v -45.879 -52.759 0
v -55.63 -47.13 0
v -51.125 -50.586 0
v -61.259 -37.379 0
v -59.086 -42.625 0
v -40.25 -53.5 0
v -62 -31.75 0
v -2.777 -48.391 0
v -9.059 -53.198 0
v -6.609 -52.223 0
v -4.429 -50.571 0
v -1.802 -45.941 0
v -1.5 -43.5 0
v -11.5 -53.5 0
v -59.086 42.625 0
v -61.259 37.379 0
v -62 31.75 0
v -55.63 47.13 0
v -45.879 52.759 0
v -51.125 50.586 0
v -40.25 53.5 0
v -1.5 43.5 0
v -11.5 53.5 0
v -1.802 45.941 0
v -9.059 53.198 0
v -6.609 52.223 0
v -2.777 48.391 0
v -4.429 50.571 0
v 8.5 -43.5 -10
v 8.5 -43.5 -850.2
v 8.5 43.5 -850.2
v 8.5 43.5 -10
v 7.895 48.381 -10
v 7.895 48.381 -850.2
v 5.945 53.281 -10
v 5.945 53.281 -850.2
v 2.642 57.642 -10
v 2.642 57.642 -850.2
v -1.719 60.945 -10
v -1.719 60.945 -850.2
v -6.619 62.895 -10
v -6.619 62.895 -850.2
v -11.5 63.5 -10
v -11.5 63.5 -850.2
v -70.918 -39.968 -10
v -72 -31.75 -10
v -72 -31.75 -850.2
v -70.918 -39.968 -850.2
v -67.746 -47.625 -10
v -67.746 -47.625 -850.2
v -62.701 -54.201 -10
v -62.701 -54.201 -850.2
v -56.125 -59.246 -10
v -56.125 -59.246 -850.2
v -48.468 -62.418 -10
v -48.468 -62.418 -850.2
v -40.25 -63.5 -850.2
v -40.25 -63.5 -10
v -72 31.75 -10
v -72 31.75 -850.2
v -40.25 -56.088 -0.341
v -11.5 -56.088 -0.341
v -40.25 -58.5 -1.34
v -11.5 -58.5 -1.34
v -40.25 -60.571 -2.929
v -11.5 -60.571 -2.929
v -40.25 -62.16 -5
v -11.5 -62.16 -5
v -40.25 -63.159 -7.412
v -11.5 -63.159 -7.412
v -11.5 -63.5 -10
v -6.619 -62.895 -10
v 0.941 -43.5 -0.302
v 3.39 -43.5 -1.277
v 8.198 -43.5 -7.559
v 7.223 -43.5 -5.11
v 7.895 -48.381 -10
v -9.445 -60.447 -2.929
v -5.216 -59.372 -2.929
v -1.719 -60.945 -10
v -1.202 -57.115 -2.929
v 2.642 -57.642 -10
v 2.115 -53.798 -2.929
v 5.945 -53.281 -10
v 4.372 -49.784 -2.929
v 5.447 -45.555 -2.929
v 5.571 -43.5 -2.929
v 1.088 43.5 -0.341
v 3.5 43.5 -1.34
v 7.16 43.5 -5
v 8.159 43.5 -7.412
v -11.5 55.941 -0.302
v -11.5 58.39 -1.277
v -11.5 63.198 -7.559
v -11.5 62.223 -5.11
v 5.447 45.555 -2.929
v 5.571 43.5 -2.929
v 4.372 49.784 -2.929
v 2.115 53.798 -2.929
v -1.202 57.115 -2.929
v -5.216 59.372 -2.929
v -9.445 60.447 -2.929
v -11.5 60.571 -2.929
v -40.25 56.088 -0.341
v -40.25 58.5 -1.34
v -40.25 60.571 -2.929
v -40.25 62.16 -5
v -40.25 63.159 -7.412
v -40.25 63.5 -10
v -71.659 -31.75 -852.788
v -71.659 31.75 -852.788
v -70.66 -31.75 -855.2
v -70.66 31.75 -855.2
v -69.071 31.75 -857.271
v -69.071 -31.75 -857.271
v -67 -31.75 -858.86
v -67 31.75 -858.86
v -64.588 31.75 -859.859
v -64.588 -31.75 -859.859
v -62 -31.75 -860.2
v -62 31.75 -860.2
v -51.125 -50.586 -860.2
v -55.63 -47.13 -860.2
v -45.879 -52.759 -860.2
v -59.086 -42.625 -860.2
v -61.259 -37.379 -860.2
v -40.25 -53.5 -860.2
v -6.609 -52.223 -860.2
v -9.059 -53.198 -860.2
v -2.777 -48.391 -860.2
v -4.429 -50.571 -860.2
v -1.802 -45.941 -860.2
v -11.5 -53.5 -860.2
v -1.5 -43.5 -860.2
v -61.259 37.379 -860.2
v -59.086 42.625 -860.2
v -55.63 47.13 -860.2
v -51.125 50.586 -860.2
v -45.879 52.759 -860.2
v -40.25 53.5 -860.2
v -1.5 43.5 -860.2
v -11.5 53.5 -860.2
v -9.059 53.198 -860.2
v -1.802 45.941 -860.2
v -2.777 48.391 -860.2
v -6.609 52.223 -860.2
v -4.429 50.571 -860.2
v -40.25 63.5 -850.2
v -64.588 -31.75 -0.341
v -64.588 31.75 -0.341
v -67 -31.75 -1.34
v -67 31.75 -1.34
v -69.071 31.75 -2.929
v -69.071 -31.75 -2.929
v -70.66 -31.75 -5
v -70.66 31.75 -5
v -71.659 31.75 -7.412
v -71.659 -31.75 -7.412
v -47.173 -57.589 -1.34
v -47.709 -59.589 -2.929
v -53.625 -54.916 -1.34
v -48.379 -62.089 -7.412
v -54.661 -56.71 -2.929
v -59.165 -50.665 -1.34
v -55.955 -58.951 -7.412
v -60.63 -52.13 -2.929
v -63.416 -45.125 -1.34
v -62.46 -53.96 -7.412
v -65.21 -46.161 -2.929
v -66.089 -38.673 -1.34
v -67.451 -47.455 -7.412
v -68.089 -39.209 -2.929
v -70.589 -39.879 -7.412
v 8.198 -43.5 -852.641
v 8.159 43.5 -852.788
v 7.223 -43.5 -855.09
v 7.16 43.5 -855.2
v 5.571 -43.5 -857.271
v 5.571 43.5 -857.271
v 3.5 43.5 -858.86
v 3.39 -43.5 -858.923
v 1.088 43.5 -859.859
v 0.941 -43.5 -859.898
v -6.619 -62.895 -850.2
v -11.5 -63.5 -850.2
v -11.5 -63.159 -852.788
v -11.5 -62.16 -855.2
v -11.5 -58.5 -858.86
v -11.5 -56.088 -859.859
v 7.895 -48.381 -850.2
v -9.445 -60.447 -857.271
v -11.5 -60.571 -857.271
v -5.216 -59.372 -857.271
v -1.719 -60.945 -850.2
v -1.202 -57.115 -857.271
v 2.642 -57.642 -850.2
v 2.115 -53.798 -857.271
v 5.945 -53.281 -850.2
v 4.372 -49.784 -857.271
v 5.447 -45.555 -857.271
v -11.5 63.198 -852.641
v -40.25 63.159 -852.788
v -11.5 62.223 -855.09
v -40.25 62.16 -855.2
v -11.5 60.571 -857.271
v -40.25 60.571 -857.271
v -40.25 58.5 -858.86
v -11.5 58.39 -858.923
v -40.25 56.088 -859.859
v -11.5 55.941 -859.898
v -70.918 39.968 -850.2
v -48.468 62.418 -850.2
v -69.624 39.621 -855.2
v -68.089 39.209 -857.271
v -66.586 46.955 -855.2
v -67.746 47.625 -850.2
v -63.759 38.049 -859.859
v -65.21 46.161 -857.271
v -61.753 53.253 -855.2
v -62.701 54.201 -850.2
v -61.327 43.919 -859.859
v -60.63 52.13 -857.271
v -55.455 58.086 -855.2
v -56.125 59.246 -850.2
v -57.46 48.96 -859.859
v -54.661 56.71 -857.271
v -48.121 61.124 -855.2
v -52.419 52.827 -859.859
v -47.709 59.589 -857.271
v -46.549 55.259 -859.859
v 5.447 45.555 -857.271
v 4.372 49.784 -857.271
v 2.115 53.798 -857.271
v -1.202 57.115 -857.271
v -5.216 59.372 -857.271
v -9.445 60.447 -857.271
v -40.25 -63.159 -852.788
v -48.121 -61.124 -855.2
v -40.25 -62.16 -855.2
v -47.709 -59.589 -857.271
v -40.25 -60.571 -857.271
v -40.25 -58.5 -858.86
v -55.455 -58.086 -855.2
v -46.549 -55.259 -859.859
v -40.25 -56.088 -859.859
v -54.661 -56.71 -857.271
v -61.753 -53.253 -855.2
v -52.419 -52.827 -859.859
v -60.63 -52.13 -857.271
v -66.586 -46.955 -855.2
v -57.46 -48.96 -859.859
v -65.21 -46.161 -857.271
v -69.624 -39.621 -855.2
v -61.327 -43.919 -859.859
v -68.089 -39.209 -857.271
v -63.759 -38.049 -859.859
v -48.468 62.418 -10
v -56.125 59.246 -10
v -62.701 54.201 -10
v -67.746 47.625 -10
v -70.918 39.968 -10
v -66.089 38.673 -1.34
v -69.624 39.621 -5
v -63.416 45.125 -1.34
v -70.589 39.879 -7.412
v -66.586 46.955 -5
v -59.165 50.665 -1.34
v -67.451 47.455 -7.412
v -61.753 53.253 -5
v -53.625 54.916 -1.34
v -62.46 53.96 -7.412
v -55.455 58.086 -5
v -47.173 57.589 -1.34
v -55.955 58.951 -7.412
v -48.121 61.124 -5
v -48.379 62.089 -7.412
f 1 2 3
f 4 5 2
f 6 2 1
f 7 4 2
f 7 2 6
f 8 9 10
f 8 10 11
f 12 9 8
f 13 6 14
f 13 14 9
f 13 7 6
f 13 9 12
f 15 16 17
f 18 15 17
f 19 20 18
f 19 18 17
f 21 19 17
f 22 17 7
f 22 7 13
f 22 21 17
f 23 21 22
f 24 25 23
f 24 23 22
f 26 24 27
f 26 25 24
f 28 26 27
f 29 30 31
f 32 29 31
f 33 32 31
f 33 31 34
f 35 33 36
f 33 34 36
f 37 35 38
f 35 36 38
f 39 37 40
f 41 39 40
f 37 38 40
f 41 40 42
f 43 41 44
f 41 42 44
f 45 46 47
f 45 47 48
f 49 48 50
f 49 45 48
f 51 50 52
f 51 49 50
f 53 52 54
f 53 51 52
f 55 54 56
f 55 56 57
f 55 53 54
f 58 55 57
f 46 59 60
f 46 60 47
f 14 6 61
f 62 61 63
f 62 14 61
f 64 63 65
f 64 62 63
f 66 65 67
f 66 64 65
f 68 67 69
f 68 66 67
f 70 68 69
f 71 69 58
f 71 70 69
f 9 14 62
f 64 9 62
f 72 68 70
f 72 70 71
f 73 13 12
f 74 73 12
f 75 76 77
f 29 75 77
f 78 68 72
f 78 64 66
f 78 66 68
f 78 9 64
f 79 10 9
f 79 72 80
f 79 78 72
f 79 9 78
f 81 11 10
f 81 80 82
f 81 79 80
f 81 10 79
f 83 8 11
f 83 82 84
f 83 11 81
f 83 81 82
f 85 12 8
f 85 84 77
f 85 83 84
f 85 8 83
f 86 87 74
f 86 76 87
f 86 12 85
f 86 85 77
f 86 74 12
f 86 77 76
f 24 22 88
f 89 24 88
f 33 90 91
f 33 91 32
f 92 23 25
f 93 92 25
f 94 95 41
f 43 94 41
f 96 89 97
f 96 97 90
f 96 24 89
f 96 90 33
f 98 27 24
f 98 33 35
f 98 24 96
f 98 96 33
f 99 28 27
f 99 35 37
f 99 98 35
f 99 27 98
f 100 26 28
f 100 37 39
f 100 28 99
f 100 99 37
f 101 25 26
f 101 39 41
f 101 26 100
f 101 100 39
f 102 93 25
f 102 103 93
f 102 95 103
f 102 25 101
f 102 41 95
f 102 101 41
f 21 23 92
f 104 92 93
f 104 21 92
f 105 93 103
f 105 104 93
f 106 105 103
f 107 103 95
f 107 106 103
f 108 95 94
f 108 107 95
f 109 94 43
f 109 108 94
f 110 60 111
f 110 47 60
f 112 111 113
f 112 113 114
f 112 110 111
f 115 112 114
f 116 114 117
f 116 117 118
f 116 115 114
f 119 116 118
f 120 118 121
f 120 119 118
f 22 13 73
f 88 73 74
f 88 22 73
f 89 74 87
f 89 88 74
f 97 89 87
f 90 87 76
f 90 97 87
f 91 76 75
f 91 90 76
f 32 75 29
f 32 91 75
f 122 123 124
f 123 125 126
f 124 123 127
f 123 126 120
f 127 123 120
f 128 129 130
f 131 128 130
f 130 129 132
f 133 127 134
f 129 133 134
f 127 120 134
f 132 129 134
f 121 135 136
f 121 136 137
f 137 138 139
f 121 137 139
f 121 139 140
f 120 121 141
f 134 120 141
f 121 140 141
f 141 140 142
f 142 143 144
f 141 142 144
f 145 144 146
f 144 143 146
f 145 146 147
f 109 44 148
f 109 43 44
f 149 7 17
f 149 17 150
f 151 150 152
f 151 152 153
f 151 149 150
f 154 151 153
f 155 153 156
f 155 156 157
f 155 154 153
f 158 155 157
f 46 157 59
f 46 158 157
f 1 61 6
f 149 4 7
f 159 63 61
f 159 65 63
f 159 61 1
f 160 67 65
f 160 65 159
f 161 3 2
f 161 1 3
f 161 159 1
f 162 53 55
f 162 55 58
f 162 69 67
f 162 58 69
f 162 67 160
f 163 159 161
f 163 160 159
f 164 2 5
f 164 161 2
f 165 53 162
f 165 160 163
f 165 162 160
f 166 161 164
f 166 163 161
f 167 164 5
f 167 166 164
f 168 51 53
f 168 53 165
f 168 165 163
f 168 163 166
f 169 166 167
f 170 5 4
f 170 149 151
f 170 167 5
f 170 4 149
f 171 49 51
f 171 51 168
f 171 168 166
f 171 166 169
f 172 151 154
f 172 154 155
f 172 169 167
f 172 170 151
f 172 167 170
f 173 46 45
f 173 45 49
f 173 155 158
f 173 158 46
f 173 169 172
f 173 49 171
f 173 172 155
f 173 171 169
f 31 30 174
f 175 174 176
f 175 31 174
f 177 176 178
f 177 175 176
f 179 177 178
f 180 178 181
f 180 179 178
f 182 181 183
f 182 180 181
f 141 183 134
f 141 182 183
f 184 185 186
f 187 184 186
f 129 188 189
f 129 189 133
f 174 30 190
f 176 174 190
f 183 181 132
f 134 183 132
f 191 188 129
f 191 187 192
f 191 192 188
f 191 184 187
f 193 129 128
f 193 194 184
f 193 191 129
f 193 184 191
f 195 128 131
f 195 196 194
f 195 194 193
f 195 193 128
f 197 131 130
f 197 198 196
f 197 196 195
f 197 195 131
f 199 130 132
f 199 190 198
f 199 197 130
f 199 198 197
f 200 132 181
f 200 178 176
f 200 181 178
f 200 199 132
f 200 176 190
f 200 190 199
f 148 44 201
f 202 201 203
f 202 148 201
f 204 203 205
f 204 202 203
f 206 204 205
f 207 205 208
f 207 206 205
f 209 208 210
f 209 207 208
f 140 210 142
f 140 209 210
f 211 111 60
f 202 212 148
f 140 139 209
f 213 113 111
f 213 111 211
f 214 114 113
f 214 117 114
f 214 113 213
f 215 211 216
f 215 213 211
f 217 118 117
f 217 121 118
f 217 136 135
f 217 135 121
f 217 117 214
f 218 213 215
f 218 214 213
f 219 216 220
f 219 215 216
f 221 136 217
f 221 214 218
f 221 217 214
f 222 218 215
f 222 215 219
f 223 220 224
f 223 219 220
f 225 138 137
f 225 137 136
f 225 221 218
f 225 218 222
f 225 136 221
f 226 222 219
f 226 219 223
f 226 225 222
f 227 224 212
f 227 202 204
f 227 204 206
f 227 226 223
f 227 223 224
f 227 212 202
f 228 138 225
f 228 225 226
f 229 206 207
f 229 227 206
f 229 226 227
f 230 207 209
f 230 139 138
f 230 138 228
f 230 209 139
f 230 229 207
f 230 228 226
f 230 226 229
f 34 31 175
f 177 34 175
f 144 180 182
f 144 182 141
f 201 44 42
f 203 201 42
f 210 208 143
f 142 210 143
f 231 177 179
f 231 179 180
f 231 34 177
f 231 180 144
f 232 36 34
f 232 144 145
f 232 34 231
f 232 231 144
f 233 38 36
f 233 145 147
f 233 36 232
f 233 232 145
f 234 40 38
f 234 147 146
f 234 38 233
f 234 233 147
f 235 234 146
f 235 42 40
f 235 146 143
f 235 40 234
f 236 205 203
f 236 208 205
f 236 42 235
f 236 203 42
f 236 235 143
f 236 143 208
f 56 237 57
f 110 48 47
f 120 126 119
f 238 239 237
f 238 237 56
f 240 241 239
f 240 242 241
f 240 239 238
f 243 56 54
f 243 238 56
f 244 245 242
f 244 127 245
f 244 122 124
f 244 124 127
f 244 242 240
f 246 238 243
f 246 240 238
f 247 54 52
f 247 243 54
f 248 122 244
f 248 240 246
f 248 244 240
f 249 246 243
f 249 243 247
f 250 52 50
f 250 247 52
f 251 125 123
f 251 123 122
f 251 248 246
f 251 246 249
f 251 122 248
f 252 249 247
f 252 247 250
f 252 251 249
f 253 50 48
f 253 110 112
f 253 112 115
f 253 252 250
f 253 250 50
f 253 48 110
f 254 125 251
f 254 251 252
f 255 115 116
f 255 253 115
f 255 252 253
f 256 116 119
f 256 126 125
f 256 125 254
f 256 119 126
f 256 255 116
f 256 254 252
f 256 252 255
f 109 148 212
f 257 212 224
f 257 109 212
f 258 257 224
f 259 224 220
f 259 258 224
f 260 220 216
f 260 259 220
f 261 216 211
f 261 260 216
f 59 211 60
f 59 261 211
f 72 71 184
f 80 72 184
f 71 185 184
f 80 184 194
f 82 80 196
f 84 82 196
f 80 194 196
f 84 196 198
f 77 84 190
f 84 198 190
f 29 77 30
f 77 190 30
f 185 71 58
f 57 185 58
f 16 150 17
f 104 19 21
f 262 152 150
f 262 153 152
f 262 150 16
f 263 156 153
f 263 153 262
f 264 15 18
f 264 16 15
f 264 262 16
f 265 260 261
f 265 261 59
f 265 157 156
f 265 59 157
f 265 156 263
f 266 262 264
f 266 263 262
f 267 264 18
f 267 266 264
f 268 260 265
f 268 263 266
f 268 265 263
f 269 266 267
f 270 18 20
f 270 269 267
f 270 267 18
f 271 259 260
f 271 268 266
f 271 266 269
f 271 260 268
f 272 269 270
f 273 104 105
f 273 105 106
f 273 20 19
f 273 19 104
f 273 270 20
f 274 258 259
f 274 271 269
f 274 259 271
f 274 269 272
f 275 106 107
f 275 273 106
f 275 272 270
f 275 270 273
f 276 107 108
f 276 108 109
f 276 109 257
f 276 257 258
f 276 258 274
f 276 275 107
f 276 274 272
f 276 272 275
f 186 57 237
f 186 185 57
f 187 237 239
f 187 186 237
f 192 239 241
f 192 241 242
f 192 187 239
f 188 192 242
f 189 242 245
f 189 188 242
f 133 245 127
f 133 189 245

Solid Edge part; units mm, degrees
sketch "Sketch1" plane through (0, 0, 0) normal (0, 0, 1) x (1, 0, 0)
  line L0 (-8.5, 63.5) -> (-40.25, 63.5)
  line L1 (8.5, 63.5) -> (-8.5, 63.5)
  line L2 (8.5, -63.5) -> (8.5, 63.5)
  line L3 (-8.5, -63.5) -> (8.5, -63.5)
  line L4 (-8.5, -63.5) -> (-40.25, -63.5)
  line L5 (-72, 31.75) -> (-72, -31.75)
  arc A0 (-72, 31.75) -> (-40.25, 63.5) centre (-40.25, 31.75) cw
  arc A1 (-40.25, -63.5) -> (-72, -31.75) centre (-40.25, -31.75) cw
extrude "Protrusion1" add sketch "Sketch1" against normal blind 860.2
fillet "Round_2" radius 20 1 edges at (8.5, -63.5, -430.1)
fillet "Round_3" radius 20 1 edges at (8.5, 63.5, -430.1)
fillet "Round_4" radius 10 16 edges at (-72, 0, -860.2) (-62.7006, 54.2006, -860.2) (-25.875, 63.5, -860.2) (2.6421, 57.6421, -860.2) (8.5, 0, -860.2) (2.6421, -57.6421, -860.2) (-25.875, -63.5, -860.2) (-62.7006, -54.2006, -860.2) (-72, 0, 0) (-62.7006, 54.2006, 0) (-25.875, 63.5, 0) (2.6421, 57.6421, 0) (8.5, 0, 0) (2.6421, -57.6421, 0) (-25.875, -63.5, 0) (-62.7006, -54.2006, 0)
properties part number "BumbleB0981"
